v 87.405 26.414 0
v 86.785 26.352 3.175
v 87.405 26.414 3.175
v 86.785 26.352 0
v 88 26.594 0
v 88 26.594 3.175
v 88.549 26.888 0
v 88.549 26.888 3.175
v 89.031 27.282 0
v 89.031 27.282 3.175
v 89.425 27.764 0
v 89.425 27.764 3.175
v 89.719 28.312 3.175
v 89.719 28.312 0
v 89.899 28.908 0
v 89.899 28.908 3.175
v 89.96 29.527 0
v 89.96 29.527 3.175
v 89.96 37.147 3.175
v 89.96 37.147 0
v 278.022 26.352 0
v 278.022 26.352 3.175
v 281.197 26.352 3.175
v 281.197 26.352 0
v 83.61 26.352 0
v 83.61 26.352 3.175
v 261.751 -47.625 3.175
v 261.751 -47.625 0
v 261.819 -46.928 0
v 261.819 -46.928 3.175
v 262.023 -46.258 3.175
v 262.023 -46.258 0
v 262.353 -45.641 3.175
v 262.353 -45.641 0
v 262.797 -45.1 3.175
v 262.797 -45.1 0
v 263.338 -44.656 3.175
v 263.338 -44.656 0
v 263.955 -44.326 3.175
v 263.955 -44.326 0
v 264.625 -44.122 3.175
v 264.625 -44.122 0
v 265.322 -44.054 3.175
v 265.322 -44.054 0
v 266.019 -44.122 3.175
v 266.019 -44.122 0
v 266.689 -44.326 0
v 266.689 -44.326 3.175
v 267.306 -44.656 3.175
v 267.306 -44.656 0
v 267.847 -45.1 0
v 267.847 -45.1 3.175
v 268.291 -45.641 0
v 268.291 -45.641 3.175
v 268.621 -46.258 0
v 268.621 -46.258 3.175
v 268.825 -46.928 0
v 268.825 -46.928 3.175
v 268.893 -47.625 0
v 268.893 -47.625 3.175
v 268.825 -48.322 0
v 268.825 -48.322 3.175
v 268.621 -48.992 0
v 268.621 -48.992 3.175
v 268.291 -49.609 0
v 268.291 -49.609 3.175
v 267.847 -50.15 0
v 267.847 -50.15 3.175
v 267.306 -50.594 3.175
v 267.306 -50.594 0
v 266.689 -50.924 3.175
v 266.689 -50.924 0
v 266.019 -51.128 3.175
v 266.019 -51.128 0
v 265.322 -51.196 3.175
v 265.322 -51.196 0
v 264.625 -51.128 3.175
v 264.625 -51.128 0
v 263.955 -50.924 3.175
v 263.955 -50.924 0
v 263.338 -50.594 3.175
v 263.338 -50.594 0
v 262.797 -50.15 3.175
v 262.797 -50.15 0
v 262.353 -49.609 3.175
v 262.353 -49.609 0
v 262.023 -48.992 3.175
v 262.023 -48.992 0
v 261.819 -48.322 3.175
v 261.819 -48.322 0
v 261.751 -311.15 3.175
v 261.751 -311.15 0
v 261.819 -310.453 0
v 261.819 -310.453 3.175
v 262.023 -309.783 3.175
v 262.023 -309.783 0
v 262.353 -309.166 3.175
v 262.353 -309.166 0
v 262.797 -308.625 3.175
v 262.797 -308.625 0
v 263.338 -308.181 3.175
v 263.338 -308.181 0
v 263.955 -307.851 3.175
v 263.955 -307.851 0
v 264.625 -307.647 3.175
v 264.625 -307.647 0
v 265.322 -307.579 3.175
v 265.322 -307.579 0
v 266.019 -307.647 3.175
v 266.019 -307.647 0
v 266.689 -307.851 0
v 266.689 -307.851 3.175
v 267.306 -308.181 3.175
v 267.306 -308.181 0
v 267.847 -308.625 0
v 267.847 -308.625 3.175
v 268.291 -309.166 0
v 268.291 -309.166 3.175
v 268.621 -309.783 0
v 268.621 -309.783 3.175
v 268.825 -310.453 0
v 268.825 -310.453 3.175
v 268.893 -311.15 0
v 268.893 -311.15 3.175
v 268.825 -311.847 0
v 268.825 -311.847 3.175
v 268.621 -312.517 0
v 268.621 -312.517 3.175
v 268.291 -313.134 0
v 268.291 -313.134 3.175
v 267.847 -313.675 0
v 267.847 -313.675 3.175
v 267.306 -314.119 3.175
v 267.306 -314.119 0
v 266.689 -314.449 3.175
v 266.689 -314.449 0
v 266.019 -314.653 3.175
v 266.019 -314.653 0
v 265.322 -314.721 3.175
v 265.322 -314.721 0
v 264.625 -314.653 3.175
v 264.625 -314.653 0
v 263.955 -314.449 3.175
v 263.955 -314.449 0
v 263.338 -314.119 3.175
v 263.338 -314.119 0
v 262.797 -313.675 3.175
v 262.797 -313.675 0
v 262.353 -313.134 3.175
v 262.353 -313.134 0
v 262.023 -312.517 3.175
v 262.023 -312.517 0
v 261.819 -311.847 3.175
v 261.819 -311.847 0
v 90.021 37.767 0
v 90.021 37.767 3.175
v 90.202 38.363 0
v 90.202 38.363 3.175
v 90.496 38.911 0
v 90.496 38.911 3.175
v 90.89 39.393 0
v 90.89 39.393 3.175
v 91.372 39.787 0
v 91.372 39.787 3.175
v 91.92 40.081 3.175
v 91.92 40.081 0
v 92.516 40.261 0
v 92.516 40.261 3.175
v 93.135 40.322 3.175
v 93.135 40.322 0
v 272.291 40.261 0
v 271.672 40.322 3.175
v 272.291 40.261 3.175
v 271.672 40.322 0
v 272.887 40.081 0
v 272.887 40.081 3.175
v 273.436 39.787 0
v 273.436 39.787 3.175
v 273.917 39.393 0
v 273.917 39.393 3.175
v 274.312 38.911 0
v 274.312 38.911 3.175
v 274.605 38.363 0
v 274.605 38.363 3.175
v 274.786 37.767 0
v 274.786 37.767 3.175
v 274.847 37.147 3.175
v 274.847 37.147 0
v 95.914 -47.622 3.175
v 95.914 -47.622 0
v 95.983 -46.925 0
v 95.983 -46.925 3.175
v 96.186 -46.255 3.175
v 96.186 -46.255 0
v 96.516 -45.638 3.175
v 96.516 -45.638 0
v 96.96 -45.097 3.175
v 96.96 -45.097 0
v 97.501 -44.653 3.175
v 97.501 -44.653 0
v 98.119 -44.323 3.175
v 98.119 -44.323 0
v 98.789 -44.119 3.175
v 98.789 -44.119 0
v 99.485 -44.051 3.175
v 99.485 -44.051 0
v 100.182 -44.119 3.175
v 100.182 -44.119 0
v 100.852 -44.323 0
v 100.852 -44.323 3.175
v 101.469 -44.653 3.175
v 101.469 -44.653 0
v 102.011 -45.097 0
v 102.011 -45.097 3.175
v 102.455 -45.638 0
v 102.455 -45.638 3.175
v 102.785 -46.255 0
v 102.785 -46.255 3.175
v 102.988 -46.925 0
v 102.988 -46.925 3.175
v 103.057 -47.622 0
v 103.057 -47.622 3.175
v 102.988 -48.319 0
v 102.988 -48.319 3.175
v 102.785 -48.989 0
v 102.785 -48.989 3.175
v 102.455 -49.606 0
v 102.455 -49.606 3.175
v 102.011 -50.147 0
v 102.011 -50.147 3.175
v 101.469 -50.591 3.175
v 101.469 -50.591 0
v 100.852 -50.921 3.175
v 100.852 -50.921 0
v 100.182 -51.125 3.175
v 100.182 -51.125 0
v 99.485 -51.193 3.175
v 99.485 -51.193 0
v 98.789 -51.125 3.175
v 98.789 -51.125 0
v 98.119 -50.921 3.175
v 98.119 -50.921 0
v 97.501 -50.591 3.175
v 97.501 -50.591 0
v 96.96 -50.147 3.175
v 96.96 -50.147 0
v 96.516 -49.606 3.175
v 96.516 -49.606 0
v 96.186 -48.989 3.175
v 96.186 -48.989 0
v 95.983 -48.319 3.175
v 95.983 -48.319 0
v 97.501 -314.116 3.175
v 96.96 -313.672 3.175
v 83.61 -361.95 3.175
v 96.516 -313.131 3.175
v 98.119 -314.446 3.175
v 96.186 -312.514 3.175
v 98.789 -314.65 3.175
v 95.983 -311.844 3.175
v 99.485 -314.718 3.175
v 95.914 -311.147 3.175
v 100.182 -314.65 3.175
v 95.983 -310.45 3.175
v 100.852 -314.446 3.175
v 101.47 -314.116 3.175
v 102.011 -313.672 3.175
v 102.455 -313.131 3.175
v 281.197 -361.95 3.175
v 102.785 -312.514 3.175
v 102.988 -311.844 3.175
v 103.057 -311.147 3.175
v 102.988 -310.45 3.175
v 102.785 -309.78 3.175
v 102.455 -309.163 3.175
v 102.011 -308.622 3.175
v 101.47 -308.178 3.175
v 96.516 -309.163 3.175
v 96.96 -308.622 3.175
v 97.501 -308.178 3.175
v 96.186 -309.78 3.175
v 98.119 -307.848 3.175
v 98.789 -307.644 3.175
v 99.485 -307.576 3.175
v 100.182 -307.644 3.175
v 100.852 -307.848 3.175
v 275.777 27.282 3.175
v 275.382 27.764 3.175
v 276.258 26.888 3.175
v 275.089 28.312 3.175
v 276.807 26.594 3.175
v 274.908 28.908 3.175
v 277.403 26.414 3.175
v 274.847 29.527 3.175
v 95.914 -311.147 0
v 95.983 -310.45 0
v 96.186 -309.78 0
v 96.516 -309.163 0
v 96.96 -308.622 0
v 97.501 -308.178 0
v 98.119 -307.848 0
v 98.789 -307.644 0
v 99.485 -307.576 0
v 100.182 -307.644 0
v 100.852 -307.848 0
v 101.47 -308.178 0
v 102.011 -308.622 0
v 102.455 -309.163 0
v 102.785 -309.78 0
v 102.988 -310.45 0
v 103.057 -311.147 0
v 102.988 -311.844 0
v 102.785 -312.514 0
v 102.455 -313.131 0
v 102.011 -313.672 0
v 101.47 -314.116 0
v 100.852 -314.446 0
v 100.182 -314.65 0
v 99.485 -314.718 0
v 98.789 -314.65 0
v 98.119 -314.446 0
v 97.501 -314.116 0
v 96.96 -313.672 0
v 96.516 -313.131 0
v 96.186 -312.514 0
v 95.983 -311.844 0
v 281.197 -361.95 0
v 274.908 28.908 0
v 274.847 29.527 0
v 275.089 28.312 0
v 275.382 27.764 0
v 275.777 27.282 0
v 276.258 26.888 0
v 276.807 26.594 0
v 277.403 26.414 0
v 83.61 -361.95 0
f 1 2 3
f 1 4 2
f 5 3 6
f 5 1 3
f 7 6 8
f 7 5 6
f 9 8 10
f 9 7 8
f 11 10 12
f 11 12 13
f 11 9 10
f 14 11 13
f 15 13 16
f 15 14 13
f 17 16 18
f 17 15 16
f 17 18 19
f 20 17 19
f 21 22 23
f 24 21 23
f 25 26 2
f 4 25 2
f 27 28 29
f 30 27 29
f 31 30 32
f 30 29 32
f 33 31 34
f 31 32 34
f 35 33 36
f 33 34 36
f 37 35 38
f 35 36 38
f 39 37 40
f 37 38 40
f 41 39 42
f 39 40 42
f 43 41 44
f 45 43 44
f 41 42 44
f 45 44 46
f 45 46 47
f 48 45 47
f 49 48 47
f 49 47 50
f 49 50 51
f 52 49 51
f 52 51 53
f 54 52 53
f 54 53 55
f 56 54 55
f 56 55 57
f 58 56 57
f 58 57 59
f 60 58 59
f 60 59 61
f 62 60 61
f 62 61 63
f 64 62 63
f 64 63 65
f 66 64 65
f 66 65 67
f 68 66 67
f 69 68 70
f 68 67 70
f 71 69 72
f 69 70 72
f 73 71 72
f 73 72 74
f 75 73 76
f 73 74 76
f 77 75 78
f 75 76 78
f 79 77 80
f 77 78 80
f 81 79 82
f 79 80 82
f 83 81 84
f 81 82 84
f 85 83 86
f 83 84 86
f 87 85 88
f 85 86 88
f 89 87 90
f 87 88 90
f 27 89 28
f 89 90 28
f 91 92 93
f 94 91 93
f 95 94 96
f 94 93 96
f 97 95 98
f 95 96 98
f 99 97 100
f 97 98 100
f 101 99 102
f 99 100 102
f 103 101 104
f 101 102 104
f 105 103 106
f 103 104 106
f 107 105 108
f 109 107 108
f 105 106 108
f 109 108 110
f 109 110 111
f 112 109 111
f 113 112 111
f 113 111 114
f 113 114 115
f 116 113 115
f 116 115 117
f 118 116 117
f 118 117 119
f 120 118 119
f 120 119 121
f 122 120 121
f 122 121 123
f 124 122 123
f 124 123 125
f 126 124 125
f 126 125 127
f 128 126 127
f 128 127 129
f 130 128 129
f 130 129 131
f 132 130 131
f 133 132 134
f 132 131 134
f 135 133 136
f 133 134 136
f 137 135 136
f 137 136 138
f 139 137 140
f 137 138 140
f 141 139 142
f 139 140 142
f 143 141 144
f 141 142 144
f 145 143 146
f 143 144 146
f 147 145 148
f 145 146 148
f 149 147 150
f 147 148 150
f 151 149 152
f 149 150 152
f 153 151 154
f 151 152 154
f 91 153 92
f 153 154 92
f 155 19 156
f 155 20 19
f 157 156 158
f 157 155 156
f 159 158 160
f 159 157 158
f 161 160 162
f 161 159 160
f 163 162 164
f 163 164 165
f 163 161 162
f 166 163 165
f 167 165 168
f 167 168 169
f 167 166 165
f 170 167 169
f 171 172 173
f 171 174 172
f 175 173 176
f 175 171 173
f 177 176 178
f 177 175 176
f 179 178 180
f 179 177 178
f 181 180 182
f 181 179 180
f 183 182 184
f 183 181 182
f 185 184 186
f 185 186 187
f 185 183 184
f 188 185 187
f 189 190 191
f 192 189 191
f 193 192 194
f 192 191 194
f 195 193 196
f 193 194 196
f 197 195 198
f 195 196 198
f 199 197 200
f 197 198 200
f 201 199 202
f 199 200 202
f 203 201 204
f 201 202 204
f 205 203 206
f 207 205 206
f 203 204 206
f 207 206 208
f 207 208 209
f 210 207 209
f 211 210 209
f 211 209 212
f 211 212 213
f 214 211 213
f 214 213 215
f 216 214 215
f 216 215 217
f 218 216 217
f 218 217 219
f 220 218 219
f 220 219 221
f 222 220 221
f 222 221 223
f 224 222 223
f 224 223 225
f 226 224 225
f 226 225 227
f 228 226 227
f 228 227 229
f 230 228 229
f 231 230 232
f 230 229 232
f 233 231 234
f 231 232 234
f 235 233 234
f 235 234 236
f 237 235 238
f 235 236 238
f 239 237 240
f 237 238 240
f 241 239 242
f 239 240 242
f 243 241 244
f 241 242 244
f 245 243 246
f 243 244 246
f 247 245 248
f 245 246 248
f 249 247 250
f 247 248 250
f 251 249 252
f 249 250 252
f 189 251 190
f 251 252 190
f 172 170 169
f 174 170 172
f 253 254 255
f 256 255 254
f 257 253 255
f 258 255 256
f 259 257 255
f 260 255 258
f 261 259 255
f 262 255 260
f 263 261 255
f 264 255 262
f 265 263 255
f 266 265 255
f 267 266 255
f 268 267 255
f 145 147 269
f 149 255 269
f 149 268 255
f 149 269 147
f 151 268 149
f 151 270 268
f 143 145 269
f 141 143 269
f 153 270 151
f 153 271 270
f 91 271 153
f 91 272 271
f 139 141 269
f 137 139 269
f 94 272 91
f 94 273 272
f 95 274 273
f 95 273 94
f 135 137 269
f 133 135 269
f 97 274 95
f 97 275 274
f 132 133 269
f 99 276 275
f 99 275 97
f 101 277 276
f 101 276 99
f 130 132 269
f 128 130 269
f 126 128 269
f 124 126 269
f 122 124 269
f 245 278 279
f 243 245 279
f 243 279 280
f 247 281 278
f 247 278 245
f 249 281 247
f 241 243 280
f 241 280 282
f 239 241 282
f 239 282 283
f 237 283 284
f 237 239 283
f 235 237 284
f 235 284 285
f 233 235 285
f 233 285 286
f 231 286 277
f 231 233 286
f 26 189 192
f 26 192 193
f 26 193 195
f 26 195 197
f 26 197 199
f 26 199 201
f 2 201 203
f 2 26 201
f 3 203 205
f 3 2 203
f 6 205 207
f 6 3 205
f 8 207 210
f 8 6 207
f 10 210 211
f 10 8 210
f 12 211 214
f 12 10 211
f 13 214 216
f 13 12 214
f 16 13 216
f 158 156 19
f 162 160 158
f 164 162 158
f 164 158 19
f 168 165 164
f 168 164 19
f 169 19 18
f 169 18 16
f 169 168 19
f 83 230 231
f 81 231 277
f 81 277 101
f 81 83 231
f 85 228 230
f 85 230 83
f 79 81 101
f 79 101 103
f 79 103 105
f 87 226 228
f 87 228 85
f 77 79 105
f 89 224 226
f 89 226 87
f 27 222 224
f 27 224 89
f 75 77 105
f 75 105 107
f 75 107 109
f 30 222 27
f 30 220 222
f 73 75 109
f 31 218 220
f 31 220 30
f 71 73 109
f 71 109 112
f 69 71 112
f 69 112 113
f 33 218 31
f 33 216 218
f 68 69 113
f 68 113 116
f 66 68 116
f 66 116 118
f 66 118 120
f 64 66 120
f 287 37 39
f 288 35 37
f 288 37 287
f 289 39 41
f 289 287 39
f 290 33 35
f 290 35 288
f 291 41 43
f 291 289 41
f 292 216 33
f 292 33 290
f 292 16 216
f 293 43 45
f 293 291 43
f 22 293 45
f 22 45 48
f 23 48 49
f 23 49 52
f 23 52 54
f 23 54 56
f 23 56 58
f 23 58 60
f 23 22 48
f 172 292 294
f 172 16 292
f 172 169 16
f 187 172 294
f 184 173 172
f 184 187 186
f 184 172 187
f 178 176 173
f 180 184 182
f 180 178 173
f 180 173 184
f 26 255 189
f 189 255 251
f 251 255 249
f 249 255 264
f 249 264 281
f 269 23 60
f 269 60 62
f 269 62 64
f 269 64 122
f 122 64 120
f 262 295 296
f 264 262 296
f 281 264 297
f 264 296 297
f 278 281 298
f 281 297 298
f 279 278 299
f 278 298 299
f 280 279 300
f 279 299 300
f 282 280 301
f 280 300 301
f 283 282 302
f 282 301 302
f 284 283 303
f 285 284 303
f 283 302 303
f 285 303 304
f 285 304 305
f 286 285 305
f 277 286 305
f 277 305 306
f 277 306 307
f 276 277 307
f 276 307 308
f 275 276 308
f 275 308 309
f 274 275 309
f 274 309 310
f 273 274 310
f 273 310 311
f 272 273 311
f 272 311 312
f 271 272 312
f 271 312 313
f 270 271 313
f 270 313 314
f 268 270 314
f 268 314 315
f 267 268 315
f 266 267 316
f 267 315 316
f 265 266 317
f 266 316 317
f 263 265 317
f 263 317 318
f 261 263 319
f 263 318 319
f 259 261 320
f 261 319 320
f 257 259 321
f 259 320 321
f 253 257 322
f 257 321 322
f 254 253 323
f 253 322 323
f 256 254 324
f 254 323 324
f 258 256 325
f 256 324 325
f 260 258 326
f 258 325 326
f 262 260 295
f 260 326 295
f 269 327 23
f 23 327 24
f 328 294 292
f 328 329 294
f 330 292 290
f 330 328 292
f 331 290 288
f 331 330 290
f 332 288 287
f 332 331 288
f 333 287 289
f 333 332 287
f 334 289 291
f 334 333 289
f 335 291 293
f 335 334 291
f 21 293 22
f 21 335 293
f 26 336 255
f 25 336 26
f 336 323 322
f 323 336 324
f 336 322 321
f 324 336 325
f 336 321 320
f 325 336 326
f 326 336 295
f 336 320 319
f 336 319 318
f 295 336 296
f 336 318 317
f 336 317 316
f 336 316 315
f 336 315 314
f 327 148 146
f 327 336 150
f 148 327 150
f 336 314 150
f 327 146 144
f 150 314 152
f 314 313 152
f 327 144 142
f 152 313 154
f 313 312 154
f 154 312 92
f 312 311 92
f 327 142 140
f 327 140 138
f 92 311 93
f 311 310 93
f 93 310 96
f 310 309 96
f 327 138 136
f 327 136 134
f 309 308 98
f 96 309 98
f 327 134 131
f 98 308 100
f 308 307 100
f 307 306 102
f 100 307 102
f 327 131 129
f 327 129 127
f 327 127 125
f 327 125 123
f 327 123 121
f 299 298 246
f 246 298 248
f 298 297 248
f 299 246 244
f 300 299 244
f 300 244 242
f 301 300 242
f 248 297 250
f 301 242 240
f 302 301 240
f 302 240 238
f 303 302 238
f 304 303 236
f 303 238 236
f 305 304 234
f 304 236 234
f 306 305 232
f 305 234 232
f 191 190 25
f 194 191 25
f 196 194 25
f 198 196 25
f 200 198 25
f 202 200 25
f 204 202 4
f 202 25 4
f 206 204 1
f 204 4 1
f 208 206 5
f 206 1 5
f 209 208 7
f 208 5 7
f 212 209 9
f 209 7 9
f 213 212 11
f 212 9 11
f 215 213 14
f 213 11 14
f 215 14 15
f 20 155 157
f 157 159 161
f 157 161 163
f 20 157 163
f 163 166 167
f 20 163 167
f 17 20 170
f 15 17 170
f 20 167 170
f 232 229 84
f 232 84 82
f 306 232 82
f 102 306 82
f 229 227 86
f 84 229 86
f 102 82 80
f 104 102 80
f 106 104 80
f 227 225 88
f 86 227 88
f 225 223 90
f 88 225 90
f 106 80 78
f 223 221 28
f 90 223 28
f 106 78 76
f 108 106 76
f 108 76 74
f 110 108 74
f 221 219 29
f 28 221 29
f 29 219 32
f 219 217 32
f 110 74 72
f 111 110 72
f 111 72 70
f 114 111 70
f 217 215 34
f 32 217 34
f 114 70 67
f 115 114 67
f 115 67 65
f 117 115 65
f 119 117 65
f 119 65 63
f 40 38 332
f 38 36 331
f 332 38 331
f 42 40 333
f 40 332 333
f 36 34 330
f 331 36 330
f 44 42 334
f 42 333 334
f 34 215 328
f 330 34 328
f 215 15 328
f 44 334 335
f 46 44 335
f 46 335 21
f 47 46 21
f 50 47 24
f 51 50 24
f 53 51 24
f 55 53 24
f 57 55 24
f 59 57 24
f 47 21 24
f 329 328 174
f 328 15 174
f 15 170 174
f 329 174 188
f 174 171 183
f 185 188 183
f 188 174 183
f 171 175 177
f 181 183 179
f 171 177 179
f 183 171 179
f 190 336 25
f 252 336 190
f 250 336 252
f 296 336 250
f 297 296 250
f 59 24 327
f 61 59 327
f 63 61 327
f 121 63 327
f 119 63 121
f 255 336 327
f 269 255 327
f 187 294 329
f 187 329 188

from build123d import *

# Parameters (mm, degrees)
SKETCH1_W                   = 197.5866
SKETCH1_H                   = 402.272499995
BOSS_EXTRUDE1_DEPTH         = 3.175
SKETCH3_W                   = 6.35
SKETCH3_H                   = 13.97
CUT_EXTRUDE1_DEPTH          = 4.175
FILLET1_R                   = 3.175
F_1_4_CLEARANCE_HOLE1_D     = 7.14248
F_1_4_CLEARANCE_HOLE1_DEPTH = 3.175


with BuildPart() as part:
    # Sketch1 → Boss-Extrude1 (new body)
    with BuildSketch(Plane.XY):
        with Locations((182.40375, -160.813750003)):
            Rectangle(SKETCH1_W, SKETCH1_H)
    extrude(amount=BOSS_EXTRUDE1_DEPTH)

    # Sketch3 → Cut-Extrude1 (cut, through all)
    with BuildSketch(Plane.XY.offset(3.175)):
        with Locations((86.78545, 33.337499995)):
            Rectangle(SKETCH3_W, SKETCH3_H)
        with Locations((278.02205, 33.337499995)):
            Rectangle(SKETCH3_W, SKETCH3_H)
    extrude(amount=-CUT_EXTRUDE1_DEPTH, mode=Mode.SUBTRACT)

    # Fillet1
    fillet1_edges = [part.edges().sort_by_distance(p)[0] for p in [
        (89.96045, 40.322499995, 1.5875),
        (89.96045, 26.352499995, 1.5875),
        (274.84705, 26.352499995, 1.5875),
        (274.84705, 40.322499995, 1.5875),
    ]]
    fillet(fillet1_edges, radius=FILLET1_R)

    # 1/4 Clearance Hole1
    with Locations(Plane.XY.offset(3.175)):
        with Locations((99.485400307, -47.621943918), (265.32205, -47.625), (265.32205, -311.15), (99.485499692, -311.146943918)):
            Hole(F_1_4_CLEARANCE_HOLE1_D / 2, depth=F_1_4_CLEARANCE_HOLE1_DEPTH)


solid = part.part
